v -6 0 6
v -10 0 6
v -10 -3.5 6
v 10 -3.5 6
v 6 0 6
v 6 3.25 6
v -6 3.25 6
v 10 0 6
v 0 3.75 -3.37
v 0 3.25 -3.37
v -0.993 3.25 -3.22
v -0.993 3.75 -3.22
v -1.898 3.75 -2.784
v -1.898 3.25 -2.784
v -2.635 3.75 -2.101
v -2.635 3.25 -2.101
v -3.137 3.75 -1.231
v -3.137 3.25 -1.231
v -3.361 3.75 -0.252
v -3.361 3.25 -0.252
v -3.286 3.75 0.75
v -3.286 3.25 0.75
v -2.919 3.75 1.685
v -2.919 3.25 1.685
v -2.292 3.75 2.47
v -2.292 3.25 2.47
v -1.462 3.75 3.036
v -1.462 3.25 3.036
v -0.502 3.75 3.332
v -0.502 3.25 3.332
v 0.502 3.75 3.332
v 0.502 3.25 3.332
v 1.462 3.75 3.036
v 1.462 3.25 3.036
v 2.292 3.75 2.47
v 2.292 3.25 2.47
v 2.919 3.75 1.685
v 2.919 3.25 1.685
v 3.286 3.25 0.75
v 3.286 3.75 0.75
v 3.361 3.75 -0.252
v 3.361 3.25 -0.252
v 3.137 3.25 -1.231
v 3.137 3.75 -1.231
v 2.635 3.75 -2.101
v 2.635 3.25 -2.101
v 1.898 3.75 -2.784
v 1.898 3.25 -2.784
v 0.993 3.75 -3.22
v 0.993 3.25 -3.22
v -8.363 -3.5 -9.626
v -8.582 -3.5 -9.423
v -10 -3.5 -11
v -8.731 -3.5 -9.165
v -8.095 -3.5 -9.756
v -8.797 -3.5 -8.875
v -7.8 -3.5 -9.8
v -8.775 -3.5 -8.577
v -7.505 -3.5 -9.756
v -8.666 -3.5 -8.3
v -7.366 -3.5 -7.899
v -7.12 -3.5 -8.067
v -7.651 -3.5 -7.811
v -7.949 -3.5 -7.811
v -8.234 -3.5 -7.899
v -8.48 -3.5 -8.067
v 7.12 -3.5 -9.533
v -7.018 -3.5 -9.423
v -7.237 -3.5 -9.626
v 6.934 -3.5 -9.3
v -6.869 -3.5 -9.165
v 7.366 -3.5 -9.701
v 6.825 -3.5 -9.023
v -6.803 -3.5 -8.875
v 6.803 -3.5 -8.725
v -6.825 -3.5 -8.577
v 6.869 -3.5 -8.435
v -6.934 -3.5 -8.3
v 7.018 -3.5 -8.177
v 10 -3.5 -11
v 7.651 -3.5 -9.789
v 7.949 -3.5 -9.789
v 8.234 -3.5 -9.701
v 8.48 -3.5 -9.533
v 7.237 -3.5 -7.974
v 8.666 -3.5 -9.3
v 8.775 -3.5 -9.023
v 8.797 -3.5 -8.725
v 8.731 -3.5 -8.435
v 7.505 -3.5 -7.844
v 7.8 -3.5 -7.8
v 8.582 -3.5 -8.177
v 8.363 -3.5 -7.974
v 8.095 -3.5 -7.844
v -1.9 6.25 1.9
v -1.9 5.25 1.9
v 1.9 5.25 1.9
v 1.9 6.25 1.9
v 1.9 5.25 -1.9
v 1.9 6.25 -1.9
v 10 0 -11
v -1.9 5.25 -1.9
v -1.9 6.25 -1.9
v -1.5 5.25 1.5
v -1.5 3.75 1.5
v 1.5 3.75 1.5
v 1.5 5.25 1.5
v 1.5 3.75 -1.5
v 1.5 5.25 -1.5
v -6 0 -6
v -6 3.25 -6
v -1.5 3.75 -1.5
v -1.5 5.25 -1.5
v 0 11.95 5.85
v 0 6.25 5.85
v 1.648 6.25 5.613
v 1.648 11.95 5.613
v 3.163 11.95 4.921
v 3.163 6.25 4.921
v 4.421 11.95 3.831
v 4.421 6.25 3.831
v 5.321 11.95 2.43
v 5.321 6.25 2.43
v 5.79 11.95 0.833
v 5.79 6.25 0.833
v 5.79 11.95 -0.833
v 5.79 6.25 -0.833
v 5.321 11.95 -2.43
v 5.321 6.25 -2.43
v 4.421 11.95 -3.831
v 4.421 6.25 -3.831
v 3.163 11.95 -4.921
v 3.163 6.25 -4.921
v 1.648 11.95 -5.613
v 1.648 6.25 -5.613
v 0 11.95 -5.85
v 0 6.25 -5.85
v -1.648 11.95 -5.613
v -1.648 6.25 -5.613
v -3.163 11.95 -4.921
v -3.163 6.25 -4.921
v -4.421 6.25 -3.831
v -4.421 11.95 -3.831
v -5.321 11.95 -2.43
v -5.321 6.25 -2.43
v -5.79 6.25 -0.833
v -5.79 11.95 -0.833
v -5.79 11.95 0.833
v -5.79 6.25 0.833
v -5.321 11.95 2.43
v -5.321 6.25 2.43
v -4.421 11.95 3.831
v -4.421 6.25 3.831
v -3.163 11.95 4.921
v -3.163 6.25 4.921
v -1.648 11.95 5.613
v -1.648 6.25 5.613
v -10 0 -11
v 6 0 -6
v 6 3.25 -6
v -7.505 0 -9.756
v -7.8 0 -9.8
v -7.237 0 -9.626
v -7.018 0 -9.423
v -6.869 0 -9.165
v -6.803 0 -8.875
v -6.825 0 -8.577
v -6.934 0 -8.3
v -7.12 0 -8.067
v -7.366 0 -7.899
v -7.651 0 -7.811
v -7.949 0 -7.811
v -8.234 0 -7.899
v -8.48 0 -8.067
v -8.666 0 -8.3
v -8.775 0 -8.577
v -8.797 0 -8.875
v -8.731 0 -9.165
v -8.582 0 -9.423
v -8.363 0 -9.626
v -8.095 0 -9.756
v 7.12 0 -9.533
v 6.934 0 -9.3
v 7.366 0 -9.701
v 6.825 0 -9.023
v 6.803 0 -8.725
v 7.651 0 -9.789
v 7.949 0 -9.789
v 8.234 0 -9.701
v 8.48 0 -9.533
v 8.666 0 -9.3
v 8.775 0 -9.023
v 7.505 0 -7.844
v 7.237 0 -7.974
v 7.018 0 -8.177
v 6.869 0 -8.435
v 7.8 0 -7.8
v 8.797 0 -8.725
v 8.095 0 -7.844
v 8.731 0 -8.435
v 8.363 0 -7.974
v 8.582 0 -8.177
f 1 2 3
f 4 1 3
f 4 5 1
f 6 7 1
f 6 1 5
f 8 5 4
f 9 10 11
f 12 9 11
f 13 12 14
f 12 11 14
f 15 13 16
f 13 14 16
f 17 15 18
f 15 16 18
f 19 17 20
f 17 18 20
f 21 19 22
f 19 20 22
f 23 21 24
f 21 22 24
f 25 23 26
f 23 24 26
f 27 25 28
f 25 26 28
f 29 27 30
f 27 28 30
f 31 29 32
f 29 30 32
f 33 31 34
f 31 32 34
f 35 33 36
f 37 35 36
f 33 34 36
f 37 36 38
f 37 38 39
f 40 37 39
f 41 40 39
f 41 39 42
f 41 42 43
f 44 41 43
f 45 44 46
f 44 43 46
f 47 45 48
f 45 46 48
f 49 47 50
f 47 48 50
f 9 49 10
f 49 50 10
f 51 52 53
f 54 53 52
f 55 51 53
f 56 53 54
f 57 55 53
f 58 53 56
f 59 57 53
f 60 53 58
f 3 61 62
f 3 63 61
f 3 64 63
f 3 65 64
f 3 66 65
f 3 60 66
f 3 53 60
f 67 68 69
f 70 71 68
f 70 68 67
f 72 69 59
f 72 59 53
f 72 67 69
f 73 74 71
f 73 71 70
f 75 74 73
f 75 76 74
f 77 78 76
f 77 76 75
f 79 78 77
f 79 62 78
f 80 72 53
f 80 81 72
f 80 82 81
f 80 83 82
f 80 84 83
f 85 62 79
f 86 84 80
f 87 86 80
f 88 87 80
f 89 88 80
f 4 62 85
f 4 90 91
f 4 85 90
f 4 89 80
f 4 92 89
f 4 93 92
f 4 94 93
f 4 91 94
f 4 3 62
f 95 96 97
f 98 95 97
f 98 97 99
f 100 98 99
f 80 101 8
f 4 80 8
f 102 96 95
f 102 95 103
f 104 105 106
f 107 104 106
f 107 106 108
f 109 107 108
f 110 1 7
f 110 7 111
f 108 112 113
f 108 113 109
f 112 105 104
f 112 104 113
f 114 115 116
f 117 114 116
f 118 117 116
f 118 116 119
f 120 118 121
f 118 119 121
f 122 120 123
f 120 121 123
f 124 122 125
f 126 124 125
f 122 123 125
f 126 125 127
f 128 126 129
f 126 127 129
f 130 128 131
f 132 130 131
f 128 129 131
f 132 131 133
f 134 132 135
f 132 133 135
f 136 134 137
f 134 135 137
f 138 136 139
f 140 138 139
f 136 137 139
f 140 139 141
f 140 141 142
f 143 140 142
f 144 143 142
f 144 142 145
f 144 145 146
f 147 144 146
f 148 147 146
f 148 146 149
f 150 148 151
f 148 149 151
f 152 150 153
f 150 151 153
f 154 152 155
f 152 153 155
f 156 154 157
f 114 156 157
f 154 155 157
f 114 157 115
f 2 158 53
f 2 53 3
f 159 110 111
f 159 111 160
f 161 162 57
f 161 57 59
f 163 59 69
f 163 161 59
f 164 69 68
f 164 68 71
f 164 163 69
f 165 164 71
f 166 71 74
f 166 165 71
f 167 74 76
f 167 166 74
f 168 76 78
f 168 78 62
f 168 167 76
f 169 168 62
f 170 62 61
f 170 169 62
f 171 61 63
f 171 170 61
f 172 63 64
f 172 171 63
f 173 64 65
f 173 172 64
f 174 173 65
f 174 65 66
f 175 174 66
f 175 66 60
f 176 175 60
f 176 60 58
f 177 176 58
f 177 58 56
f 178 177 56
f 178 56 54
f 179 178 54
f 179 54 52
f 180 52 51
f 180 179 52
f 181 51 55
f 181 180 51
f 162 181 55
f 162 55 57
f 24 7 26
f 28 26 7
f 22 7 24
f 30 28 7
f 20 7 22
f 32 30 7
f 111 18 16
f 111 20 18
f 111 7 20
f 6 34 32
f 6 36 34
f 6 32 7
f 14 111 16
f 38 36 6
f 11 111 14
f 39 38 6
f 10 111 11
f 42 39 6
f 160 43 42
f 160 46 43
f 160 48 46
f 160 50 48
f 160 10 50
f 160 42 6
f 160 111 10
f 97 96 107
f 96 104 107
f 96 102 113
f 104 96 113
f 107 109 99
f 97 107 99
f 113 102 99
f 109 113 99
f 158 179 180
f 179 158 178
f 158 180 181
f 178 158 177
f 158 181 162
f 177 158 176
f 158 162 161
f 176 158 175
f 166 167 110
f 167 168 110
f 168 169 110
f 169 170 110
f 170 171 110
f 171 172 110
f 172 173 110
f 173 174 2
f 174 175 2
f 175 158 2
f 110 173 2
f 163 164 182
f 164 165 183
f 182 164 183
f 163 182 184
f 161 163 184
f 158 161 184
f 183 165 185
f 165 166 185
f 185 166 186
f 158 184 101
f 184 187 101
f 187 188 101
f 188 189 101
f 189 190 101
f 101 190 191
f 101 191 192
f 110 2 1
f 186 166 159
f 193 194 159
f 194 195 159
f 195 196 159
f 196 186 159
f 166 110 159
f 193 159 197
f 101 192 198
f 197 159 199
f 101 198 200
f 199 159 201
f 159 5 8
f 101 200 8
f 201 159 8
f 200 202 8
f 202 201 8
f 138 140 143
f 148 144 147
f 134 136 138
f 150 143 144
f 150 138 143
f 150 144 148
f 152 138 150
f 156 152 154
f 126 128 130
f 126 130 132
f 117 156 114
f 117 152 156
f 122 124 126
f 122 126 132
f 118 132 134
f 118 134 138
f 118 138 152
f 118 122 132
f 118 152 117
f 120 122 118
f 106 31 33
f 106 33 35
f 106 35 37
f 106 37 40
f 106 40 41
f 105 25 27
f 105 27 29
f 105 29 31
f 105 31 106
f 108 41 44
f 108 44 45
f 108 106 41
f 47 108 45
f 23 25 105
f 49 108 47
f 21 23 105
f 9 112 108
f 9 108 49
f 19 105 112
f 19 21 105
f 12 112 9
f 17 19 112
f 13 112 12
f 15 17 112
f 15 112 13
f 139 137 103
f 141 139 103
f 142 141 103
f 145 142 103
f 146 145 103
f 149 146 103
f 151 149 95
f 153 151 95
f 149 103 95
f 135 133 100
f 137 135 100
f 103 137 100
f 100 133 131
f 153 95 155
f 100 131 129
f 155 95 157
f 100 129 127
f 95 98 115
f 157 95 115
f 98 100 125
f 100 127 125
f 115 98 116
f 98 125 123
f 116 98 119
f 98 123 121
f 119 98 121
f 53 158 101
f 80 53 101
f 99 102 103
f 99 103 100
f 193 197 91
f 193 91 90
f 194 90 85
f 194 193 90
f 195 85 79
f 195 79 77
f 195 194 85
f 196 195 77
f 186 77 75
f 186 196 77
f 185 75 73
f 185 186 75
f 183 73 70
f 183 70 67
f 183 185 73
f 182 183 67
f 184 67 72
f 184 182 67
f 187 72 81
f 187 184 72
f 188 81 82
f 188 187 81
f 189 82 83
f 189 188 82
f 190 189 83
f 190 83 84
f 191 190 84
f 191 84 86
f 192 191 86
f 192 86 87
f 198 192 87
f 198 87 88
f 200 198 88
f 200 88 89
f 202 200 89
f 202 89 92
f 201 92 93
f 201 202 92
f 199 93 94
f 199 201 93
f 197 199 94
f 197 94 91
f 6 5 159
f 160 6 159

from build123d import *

# Parameters (mm, degrees)
SKETCH2_W           = 12
SKETCH2_H           = 12
BOSS_EXTRUDE1_DEPTH = 3.25
SKETCH3_R           = 3.37
SKETCH3_W           = 3
SKETCH3_H           = 3
BOSS_EXTRUDE2_DEPTH = 0.5
SKETCH3_4_W         = 3
SKETCH3_4_H         = 3
BOSS_EXTRUDE3_DEPTH = 4
BOSS_EXTRUDE4_START = 2
SKETCH3_5_W         = 3.8
SKETCH3_5_H         = 3.8
SKETCH3_5_W_2       = 3
SKETCH3_5_H_2       = 3
BOSS_EXTRUDE4_DEPTH = 2
SKETCH4_W           = 20
SKETCH4_H           = 17
SKETCH4_R           = 1
BOSS_EXTRUDE5_DEPTH = 3.5
BOSS_EXTRUDE6_START = 3
SKETCH7_R           = 5.85
BOSS_EXTRUDE6_DEPTH = 5.7


with BuildPart() as part:
    # Sketch2 → Boss-Extrude1 (new body)
    with BuildSketch(Plane(origin=(0, 0, 0), x_dir=(1, 0, 0), z_dir=(0, 1, 0))):
        Rectangle(SKETCH2_W, SKETCH2_H)
    extrude(amount=BOSS_EXTRUDE1_DEPTH)

    # Sketch3 → Boss-Extrude2 (add)
    with BuildSketch(Plane(origin=(0, 3.25, 0), x_dir=(1, 0, 0), z_dir=(0, 1, 0))):
        Circle(SKETCH3_R)
        Rectangle(SKETCH3_W, SKETCH3_H, mode=Mode.SUBTRACT)
    extrude(amount=BOSS_EXTRUDE2_DEPTH)

    # Sketch3<4> → Boss-Extrude3 (add)
    with BuildSketch(Plane(origin=(0, 3.25, 0), x_dir=(1, 0, 0), z_dir=(0, 1, 0))):
        Rectangle(SKETCH3_4_W, SKETCH3_4_H)
    extrude(amount=BOSS_EXTRUDE3_DEPTH)

    # Sketch3<5> → Boss-Extrude4 (add)
    with BuildSketch(Plane(origin=(0, 3.25, 0), x_dir=(1, 0, 0), z_dir=(0, 1, 0)).offset(BOSS_EXTRUDE4_START)):
        Rectangle(SKETCH3_5_W, SKETCH3_5_H)
        Rectangle(SKETCH3_5_W_2, SKETCH3_5_H_2, mode=Mode.SUBTRACT)
    extrude(amount=BOSS_EXTRUDE4_DEPTH)

    # Sketch4 → Boss-Extrude5 (add)
    with BuildSketch(Plane.XZ):
        with Locations((0, -2.5)):
            Rectangle(SKETCH4_W, SKETCH4_H)
        with Locations((-7.8, -8.8)):
            Circle(SKETCH4_R, mode=Mode.SUBTRACT)
        with Locations((7.8, -8.8)):
            Circle(SKETCH4_R, mode=Mode.SUBTRACT)
    extrude(amount=BOSS_EXTRUDE5_DEPTH)

    # Sketch7 → Boss-Extrude6 (add)
    with BuildSketch(Plane(origin=(0, 3.25, 0), x_dir=(1, 0, 0), z_dir=(0, 1, 0)).offset(BOSS_EXTRUDE6_START)):
        Circle(SKETCH7_R)
    extrude(amount=BOSS_EXTRUDE6_DEPTH)


solid = part.part
